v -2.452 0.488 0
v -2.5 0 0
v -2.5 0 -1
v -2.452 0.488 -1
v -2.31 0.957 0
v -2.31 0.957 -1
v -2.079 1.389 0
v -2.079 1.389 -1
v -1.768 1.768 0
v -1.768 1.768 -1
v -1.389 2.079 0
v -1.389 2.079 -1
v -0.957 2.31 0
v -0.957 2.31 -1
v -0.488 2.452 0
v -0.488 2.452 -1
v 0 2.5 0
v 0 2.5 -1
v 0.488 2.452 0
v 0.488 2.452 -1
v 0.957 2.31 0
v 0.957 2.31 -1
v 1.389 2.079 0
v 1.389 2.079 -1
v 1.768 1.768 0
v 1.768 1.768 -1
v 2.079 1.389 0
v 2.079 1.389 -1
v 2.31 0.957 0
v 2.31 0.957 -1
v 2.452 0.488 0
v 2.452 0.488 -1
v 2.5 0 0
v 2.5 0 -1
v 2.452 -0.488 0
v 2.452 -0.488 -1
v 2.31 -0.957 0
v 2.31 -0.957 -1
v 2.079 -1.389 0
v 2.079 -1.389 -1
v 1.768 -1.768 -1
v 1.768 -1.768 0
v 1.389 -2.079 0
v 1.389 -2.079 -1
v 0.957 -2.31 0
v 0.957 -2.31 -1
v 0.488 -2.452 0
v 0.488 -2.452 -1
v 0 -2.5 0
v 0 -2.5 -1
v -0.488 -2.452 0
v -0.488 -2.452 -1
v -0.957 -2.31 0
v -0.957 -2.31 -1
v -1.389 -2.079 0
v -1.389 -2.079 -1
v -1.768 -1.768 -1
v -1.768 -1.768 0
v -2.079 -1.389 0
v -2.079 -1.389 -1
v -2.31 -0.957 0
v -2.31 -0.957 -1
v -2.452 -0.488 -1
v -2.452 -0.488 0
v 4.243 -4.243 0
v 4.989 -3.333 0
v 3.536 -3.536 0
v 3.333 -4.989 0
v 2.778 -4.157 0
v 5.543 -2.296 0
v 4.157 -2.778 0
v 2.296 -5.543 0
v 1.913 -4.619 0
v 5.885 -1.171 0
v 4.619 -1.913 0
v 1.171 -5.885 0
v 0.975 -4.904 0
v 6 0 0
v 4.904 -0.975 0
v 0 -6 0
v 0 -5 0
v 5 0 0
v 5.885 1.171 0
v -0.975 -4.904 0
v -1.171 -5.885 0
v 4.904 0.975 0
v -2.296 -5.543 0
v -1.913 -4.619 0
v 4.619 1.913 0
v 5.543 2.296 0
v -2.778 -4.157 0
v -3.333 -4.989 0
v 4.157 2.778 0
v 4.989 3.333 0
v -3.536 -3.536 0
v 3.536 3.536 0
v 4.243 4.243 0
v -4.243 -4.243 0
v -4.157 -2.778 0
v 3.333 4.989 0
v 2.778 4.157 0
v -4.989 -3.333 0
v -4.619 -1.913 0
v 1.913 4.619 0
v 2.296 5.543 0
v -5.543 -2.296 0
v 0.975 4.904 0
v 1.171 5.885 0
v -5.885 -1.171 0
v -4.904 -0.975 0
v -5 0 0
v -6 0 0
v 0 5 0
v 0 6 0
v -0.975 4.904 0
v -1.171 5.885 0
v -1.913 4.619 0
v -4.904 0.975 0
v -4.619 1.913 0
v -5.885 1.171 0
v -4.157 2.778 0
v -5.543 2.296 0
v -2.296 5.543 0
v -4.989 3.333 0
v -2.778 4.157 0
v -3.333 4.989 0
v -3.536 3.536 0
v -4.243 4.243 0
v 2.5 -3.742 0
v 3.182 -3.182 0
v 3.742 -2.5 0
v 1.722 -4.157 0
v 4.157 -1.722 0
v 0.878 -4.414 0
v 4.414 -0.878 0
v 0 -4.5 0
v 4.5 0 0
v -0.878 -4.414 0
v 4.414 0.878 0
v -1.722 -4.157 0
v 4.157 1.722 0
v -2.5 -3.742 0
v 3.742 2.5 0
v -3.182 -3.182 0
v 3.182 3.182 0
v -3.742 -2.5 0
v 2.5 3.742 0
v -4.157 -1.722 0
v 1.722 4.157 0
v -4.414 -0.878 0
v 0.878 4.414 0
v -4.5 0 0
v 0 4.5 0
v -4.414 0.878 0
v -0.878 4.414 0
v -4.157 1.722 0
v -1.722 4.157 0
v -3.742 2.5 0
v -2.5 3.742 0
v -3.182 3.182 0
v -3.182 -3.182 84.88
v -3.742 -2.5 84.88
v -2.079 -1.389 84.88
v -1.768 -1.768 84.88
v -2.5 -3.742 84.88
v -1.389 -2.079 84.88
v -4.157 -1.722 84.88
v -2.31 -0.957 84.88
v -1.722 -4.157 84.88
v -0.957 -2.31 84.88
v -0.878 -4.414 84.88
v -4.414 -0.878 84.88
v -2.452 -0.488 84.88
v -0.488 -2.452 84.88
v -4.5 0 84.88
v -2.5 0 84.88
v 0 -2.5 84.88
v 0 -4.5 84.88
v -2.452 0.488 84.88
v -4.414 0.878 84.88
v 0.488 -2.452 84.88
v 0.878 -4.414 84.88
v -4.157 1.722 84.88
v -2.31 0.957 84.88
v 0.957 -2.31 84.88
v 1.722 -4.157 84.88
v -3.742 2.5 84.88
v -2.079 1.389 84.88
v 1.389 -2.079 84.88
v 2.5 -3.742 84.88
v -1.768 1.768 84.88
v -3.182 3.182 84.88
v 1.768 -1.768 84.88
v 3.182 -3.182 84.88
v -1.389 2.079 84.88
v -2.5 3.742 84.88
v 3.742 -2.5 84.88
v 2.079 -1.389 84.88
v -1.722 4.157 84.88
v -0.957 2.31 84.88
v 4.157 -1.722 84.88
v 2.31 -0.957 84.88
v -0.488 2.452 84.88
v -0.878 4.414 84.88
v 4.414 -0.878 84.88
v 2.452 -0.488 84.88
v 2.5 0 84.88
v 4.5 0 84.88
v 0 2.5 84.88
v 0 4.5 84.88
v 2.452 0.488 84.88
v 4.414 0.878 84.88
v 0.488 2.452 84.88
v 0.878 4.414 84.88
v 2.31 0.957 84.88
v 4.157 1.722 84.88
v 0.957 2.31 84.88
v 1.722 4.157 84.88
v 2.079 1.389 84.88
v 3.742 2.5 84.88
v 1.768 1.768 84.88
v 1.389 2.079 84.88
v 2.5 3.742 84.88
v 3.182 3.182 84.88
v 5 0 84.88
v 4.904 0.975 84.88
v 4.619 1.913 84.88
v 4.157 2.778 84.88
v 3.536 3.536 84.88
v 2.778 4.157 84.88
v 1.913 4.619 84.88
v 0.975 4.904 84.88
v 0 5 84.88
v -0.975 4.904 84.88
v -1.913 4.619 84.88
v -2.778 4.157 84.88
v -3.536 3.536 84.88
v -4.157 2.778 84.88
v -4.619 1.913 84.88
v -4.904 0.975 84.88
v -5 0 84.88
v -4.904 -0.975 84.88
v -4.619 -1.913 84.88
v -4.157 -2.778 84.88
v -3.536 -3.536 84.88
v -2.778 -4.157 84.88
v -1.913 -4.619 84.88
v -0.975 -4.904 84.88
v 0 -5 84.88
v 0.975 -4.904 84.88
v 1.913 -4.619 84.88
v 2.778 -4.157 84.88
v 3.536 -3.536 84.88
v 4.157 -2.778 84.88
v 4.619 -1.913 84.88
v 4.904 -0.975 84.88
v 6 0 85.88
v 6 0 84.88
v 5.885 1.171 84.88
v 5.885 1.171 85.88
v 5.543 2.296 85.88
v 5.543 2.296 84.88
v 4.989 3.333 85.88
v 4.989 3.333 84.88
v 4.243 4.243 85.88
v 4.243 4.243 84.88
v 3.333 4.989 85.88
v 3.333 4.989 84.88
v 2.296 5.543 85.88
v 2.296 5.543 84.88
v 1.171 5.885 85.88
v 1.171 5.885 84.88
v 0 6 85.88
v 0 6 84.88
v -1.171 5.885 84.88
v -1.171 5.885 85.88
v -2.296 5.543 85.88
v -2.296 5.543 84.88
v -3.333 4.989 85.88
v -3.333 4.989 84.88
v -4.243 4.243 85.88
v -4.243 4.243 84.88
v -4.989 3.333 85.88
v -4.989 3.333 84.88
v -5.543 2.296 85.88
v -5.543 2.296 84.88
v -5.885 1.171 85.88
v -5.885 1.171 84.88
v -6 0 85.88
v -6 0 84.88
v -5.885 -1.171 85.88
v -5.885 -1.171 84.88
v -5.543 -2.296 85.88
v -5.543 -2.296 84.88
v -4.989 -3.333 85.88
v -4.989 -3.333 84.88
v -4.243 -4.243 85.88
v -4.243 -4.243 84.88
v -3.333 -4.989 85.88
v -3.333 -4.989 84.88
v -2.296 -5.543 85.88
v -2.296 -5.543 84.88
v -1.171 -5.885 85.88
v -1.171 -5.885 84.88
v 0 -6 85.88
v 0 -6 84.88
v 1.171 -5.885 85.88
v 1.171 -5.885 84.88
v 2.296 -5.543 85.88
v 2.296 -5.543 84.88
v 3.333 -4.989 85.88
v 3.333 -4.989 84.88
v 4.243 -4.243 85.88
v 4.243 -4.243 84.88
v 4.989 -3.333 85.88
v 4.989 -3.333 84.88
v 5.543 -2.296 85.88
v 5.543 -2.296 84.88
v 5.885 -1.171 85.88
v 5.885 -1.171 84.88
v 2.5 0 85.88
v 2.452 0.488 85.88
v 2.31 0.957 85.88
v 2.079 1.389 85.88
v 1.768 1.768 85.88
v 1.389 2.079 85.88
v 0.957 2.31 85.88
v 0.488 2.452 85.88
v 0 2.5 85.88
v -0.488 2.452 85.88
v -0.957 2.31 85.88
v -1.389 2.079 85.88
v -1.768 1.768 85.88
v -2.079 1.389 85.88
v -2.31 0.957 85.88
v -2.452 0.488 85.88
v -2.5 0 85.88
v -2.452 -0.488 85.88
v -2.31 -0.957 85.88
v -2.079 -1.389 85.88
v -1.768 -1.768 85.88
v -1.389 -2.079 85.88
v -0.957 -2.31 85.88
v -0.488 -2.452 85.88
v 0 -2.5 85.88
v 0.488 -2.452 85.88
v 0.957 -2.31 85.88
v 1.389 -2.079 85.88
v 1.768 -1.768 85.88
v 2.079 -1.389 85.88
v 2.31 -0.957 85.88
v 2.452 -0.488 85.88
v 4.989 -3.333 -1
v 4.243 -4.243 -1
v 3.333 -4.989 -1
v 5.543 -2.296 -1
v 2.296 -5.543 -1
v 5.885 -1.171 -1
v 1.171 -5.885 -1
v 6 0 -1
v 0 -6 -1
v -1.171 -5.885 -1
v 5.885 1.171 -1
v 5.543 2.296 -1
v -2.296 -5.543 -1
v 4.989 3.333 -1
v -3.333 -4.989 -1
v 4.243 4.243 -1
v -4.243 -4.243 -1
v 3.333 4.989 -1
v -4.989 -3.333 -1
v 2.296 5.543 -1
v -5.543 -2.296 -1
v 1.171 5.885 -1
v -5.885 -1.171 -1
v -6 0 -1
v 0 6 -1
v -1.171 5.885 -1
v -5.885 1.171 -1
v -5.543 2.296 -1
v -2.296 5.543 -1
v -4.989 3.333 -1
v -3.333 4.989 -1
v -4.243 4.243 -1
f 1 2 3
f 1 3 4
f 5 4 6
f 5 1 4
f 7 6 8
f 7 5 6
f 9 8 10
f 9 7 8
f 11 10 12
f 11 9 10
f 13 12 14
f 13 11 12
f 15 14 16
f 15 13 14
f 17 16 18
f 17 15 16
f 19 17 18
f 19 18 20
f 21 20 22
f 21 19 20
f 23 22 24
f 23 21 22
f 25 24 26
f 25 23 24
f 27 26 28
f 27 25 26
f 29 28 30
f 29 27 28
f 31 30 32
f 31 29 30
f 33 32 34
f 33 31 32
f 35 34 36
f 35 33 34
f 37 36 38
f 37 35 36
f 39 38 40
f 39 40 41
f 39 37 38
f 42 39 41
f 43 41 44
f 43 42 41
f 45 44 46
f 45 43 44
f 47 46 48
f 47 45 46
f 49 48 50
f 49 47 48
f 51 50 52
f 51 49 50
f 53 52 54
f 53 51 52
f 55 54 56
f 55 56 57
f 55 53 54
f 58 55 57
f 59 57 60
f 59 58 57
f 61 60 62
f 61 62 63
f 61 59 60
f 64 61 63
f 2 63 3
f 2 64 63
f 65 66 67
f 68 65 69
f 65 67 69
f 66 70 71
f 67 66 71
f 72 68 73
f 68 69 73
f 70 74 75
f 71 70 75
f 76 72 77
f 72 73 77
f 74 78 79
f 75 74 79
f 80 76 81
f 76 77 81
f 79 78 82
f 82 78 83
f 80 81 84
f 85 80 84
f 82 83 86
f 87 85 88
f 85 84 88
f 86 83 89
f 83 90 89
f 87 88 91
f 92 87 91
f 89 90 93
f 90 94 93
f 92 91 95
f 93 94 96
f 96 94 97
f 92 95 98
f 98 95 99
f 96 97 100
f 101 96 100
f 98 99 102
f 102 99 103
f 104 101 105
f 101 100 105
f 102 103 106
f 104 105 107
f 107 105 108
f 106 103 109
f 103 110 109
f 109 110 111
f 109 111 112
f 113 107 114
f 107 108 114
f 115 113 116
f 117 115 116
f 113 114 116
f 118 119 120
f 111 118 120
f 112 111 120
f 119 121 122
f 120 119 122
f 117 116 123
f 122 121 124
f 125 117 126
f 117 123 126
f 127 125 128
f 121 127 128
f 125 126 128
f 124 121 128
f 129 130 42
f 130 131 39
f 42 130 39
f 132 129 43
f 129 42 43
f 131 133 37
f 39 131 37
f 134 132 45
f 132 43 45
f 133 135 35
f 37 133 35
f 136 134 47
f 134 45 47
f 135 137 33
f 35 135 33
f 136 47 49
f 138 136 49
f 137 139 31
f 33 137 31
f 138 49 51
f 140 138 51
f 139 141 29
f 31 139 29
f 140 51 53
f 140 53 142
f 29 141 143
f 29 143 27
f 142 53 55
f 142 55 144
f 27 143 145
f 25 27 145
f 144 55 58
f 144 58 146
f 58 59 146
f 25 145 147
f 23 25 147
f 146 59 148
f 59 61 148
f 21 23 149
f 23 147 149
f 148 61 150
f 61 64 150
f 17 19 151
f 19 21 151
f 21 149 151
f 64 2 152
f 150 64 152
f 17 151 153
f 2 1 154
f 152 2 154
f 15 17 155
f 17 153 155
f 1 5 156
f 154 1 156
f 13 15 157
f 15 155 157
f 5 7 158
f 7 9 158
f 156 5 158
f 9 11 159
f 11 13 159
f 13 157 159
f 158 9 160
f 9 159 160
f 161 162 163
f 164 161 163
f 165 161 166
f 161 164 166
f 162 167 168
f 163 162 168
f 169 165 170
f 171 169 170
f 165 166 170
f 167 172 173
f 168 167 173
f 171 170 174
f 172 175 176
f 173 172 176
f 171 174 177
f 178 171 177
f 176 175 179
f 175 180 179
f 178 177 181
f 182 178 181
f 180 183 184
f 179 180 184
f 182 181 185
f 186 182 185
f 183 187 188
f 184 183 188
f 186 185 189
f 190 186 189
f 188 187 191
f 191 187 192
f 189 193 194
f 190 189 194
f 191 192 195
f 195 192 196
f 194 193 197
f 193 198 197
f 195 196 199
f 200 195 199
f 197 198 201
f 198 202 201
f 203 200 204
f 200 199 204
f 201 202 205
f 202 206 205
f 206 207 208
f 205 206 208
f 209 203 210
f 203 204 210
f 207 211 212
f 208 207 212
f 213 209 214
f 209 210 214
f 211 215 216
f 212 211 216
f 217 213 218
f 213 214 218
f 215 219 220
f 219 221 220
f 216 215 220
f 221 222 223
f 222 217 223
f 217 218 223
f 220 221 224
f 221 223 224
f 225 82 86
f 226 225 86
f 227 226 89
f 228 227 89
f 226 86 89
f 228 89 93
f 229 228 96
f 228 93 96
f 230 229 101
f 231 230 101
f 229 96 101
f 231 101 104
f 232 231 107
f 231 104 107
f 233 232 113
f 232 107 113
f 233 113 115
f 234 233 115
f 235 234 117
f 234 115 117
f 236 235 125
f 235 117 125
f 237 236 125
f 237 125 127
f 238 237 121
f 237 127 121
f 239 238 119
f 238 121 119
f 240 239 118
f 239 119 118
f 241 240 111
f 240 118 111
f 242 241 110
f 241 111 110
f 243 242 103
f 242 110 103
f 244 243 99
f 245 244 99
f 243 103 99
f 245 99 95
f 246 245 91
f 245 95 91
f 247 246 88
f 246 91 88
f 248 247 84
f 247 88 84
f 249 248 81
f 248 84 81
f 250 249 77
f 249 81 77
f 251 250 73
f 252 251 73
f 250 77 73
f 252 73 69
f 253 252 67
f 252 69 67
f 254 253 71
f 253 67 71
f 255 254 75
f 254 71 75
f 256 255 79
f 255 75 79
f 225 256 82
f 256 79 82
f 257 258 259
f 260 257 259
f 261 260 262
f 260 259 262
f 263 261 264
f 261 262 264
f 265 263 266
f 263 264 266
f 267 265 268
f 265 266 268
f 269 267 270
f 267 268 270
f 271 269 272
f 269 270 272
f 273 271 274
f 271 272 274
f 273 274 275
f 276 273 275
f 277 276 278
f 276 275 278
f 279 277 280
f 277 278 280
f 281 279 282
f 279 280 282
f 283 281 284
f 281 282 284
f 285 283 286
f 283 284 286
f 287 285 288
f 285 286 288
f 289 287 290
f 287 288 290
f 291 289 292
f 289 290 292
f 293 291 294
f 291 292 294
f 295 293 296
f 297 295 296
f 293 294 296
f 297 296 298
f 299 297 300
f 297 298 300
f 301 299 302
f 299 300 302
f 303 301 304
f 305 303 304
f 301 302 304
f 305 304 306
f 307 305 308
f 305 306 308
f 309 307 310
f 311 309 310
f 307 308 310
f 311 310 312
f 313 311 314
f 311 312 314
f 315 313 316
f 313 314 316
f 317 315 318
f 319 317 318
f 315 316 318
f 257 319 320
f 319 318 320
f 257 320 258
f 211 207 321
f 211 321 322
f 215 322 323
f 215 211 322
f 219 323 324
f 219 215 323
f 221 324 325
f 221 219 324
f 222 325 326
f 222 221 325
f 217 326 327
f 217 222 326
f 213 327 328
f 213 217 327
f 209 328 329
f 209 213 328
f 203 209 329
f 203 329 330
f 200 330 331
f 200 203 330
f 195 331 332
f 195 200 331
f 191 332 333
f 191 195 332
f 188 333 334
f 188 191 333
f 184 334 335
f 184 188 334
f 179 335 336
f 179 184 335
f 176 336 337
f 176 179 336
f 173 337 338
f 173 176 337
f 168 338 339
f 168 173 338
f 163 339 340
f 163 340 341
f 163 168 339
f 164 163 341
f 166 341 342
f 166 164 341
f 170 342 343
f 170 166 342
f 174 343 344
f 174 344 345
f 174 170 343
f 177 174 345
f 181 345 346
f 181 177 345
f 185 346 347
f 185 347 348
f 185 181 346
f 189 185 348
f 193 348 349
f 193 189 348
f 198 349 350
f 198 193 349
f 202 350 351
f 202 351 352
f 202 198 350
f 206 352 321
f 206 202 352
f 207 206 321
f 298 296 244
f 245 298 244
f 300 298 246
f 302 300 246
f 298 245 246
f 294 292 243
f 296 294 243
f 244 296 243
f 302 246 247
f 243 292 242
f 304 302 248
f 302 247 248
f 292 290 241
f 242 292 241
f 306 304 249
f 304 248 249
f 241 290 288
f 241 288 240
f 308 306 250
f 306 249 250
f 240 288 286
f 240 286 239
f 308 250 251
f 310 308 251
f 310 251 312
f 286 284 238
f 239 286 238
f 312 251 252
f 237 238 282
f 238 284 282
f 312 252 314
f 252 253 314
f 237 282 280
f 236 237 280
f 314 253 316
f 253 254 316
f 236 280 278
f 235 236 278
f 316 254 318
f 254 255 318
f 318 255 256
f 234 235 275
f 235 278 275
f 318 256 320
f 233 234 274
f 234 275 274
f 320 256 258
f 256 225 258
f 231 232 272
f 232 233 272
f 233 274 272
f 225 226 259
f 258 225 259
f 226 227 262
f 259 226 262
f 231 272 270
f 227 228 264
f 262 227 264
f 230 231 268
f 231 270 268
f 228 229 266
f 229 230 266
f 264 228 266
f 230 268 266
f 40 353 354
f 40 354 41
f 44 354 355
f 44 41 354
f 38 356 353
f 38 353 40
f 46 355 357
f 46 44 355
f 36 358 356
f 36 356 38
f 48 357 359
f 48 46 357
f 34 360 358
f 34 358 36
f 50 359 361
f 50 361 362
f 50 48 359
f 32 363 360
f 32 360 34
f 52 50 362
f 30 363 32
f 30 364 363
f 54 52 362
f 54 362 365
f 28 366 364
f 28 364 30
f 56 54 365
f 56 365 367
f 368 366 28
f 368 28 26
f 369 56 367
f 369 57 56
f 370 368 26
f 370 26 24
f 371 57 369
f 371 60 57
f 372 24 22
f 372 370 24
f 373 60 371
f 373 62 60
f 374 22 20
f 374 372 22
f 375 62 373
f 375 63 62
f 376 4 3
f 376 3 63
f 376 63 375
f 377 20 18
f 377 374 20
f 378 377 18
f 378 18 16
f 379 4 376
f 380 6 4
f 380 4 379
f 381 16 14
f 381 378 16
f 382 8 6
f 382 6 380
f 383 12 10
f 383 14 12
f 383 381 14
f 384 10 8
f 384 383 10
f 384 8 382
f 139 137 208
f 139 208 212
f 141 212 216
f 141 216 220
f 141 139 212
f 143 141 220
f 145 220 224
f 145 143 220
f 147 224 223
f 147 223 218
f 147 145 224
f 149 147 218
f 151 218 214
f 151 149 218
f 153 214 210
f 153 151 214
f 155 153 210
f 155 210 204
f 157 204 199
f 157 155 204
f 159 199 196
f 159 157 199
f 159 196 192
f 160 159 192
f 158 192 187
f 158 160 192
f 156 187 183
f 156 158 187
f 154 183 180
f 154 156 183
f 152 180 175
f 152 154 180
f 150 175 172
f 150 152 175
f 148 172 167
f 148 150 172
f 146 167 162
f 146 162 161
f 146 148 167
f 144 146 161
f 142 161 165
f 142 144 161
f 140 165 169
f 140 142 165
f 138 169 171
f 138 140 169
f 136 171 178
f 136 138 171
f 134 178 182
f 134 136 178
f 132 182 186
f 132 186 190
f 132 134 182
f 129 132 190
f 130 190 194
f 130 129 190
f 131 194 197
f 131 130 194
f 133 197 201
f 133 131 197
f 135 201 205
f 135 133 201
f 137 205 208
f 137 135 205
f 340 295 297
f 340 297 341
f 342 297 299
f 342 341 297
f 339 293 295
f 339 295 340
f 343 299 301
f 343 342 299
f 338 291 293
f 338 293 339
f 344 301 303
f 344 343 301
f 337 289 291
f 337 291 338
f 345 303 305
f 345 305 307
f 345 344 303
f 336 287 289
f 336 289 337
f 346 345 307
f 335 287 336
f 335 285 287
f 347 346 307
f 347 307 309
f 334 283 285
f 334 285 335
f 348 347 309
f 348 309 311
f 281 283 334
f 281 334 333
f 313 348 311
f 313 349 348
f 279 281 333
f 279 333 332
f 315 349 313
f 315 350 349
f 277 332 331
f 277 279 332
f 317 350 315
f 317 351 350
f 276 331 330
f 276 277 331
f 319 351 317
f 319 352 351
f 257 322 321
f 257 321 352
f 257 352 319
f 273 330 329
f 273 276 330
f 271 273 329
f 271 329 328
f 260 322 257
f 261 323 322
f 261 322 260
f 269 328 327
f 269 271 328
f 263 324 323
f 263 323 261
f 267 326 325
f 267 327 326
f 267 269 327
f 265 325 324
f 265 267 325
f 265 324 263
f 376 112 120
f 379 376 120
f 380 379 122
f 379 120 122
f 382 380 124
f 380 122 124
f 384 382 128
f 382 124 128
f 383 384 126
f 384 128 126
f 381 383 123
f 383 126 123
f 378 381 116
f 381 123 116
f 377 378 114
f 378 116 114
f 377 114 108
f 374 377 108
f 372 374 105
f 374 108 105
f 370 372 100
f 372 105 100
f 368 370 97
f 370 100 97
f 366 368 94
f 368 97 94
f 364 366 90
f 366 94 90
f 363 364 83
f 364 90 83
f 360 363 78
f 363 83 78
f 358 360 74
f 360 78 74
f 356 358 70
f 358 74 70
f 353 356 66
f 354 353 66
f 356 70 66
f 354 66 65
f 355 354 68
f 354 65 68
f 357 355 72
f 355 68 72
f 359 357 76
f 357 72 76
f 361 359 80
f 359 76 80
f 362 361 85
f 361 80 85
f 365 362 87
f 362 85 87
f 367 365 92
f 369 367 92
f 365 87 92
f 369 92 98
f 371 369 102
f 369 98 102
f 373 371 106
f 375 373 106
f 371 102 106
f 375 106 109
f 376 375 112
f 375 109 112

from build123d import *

# Parameters (mm, degrees)
SKETCH1_R           = 5
SKETCH1_R_2         = 4.5
BOSS_EXTRUDE1_DEPTH = 84.88
SKETCH2_R           = 6
SKETCH2_R_2         = 2.5
BOSS_EXTRUDE2_DEPTH = 1
SKETCH3_R           = 6
SKETCH3_R_2         = 2.5
BOSS_EXTRUDE3_DEPTH = 1


with BuildPart() as part:
    # Sketch1 → Boss-Extrude1 (new body)
    with BuildSketch(Plane.XY):
        Circle(SKETCH1_R)
        Circle(SKETCH1_R_2, mode=Mode.SUBTRACT)
    extrude(amount=BOSS_EXTRUDE1_DEPTH)

    # Sketch2 → Boss-Extrude2 (add)
    with BuildSketch(Plane(origin=(0, 0, 0), x_dir=(-1, 0, 0), z_dir=(0, 0, -1))):
        Circle(SKETCH2_R)
        Circle(SKETCH2_R_2, mode=Mode.SUBTRACT)
    extrude(amount=BOSS_EXTRUDE2_DEPTH)

    # Sketch3 → Boss-Extrude3 (add)
    with BuildSketch(Plane.XY.offset(84.88)):
        Circle(SKETCH3_R)
        Circle(SKETCH3_R_2, mode=Mode.SUBTRACT)
    extrude(amount=BOSS_EXTRUDE3_DEPTH)


solid = part.part
